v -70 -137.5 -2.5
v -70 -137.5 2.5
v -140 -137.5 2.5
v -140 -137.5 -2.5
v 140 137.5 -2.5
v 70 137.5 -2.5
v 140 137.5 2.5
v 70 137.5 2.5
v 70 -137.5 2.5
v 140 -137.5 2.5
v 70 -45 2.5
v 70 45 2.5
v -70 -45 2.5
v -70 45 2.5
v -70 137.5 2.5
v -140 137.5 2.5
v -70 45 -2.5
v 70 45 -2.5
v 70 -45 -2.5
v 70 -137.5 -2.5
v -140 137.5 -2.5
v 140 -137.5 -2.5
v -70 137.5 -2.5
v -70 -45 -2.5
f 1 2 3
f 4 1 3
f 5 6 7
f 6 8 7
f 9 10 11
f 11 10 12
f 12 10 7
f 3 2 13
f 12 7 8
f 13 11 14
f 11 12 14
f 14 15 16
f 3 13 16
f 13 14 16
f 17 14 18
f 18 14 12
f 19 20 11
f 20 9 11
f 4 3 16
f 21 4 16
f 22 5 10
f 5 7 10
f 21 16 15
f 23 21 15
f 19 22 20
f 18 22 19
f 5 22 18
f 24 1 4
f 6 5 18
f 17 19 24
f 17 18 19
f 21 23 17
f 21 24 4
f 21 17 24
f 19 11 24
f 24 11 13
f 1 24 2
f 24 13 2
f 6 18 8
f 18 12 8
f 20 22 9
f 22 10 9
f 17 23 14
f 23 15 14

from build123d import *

# Parameters (mm, degrees)
PAD_DEPTH = 2.5


with BuildPart() as part:
    # Sketch → Pad (new body, symmetric)
    with BuildSketch(Plane.XY):
        Polygon((-140, 137.5), (-70, 137.5), (-70, 45), (70, 45), (70, 137.5), (140, 137.5), (140, -137.5), (70, -137.5), (70, -45), (-70, -45), (-70, -137.5), (-140, -137.5), align=None)
    extrude(amount=PAD_DEPTH, both=True)


solid = part.part
